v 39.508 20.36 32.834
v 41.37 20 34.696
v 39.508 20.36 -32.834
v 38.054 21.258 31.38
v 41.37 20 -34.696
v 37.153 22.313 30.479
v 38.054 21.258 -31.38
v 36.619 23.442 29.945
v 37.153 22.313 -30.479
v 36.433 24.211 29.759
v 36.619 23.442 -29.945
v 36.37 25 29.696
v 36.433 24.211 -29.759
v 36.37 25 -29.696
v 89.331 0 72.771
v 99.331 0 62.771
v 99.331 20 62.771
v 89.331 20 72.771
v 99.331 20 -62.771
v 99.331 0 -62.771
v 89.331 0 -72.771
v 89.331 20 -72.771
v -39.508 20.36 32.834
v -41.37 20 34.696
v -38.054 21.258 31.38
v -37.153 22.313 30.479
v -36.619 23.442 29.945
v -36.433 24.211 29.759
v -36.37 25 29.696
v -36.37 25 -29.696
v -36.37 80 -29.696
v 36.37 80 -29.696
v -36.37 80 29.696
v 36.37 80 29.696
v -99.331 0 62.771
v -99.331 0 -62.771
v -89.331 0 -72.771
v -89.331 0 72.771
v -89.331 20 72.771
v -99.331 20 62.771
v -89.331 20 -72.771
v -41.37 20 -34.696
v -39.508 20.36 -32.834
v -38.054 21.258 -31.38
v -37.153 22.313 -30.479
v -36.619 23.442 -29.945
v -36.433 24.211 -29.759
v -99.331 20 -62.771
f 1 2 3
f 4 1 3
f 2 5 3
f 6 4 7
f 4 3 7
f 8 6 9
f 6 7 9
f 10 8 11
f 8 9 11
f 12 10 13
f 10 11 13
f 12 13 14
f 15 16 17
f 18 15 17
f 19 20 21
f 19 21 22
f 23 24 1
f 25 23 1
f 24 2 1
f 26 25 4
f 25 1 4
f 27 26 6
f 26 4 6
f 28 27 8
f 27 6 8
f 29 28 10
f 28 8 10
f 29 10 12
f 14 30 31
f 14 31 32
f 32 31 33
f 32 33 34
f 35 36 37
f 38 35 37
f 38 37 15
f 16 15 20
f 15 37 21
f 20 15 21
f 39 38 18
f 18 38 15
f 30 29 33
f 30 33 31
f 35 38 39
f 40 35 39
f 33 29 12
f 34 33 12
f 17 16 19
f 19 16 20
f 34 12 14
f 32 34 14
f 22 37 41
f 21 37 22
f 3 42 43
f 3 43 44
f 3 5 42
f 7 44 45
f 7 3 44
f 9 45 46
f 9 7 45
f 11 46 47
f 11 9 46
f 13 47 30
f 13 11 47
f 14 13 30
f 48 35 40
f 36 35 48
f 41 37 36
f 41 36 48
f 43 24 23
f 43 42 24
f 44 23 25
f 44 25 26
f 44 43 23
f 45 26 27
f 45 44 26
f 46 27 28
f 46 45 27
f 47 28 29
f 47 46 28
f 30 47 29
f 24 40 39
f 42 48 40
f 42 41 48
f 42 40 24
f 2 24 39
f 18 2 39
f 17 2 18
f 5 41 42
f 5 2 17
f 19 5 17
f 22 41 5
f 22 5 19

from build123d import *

# Parameters (mm, degrees)
ESQUISSE1_W        = 198.661449586
ESQUISSE1_H        = 145.541105456
BOSS_EXTRU_1_DEPTH = 20
ESQUISSE2_W        = 72.740275378
ESQUISSE2_H        = 59.392258424
BOSS_EXTRU_2_DEPTH = 60
CONG_1_R           = 5
CHANFREIN1_SIZE    = 10


with BuildPart() as part:
    # Esquisse1 → Boss.-Extru.1 (new body)
    with BuildSketch(Plane(origin=(0, 0, 0), x_dir=(1, 0, 0), z_dir=(0, 1, 0))):
        Rectangle(ESQUISSE1_W, ESQUISSE1_H)
    extrude(amount=BOSS_EXTRU_1_DEPTH)

    # Esquisse2 → Boss.-Extru.2 (add)
    with BuildSketch(Plane(origin=(0, 20, 0), x_dir=(1, 0, 0), z_dir=(0, 1, 0))):
        Rectangle(ESQUISSE2_W, ESQUISSE2_H)
    extrude(amount=BOSS_EXTRU_2_DEPTH)

    # Congé1
    cong_1_edges = [part.edges().sort_by_distance(p)[0] for p in [
        (36.370137689, 20, 0),
        (0, 20, -29.696129212),
        (-36.370137689, 20, 0),
        (0, 20, 29.696129212),
    ]]
    fillet(cong_1_edges, radius=CONG_1_R)

    # Chanfrein1
    chanfrein1_edges = [part.edges().sort_by_distance(p)[0] for p in [
        (99.330724793, 10, 72.770552728),
        (-99.330724793, 10, 72.770552728),
        (-99.330724793, 10, -72.770552728),
        (99.330724793, 10, -72.770552728),
    ]]
    chamfer(chanfrein1_edges, length=CHANFREIN1_SIZE)


solid = part.part
